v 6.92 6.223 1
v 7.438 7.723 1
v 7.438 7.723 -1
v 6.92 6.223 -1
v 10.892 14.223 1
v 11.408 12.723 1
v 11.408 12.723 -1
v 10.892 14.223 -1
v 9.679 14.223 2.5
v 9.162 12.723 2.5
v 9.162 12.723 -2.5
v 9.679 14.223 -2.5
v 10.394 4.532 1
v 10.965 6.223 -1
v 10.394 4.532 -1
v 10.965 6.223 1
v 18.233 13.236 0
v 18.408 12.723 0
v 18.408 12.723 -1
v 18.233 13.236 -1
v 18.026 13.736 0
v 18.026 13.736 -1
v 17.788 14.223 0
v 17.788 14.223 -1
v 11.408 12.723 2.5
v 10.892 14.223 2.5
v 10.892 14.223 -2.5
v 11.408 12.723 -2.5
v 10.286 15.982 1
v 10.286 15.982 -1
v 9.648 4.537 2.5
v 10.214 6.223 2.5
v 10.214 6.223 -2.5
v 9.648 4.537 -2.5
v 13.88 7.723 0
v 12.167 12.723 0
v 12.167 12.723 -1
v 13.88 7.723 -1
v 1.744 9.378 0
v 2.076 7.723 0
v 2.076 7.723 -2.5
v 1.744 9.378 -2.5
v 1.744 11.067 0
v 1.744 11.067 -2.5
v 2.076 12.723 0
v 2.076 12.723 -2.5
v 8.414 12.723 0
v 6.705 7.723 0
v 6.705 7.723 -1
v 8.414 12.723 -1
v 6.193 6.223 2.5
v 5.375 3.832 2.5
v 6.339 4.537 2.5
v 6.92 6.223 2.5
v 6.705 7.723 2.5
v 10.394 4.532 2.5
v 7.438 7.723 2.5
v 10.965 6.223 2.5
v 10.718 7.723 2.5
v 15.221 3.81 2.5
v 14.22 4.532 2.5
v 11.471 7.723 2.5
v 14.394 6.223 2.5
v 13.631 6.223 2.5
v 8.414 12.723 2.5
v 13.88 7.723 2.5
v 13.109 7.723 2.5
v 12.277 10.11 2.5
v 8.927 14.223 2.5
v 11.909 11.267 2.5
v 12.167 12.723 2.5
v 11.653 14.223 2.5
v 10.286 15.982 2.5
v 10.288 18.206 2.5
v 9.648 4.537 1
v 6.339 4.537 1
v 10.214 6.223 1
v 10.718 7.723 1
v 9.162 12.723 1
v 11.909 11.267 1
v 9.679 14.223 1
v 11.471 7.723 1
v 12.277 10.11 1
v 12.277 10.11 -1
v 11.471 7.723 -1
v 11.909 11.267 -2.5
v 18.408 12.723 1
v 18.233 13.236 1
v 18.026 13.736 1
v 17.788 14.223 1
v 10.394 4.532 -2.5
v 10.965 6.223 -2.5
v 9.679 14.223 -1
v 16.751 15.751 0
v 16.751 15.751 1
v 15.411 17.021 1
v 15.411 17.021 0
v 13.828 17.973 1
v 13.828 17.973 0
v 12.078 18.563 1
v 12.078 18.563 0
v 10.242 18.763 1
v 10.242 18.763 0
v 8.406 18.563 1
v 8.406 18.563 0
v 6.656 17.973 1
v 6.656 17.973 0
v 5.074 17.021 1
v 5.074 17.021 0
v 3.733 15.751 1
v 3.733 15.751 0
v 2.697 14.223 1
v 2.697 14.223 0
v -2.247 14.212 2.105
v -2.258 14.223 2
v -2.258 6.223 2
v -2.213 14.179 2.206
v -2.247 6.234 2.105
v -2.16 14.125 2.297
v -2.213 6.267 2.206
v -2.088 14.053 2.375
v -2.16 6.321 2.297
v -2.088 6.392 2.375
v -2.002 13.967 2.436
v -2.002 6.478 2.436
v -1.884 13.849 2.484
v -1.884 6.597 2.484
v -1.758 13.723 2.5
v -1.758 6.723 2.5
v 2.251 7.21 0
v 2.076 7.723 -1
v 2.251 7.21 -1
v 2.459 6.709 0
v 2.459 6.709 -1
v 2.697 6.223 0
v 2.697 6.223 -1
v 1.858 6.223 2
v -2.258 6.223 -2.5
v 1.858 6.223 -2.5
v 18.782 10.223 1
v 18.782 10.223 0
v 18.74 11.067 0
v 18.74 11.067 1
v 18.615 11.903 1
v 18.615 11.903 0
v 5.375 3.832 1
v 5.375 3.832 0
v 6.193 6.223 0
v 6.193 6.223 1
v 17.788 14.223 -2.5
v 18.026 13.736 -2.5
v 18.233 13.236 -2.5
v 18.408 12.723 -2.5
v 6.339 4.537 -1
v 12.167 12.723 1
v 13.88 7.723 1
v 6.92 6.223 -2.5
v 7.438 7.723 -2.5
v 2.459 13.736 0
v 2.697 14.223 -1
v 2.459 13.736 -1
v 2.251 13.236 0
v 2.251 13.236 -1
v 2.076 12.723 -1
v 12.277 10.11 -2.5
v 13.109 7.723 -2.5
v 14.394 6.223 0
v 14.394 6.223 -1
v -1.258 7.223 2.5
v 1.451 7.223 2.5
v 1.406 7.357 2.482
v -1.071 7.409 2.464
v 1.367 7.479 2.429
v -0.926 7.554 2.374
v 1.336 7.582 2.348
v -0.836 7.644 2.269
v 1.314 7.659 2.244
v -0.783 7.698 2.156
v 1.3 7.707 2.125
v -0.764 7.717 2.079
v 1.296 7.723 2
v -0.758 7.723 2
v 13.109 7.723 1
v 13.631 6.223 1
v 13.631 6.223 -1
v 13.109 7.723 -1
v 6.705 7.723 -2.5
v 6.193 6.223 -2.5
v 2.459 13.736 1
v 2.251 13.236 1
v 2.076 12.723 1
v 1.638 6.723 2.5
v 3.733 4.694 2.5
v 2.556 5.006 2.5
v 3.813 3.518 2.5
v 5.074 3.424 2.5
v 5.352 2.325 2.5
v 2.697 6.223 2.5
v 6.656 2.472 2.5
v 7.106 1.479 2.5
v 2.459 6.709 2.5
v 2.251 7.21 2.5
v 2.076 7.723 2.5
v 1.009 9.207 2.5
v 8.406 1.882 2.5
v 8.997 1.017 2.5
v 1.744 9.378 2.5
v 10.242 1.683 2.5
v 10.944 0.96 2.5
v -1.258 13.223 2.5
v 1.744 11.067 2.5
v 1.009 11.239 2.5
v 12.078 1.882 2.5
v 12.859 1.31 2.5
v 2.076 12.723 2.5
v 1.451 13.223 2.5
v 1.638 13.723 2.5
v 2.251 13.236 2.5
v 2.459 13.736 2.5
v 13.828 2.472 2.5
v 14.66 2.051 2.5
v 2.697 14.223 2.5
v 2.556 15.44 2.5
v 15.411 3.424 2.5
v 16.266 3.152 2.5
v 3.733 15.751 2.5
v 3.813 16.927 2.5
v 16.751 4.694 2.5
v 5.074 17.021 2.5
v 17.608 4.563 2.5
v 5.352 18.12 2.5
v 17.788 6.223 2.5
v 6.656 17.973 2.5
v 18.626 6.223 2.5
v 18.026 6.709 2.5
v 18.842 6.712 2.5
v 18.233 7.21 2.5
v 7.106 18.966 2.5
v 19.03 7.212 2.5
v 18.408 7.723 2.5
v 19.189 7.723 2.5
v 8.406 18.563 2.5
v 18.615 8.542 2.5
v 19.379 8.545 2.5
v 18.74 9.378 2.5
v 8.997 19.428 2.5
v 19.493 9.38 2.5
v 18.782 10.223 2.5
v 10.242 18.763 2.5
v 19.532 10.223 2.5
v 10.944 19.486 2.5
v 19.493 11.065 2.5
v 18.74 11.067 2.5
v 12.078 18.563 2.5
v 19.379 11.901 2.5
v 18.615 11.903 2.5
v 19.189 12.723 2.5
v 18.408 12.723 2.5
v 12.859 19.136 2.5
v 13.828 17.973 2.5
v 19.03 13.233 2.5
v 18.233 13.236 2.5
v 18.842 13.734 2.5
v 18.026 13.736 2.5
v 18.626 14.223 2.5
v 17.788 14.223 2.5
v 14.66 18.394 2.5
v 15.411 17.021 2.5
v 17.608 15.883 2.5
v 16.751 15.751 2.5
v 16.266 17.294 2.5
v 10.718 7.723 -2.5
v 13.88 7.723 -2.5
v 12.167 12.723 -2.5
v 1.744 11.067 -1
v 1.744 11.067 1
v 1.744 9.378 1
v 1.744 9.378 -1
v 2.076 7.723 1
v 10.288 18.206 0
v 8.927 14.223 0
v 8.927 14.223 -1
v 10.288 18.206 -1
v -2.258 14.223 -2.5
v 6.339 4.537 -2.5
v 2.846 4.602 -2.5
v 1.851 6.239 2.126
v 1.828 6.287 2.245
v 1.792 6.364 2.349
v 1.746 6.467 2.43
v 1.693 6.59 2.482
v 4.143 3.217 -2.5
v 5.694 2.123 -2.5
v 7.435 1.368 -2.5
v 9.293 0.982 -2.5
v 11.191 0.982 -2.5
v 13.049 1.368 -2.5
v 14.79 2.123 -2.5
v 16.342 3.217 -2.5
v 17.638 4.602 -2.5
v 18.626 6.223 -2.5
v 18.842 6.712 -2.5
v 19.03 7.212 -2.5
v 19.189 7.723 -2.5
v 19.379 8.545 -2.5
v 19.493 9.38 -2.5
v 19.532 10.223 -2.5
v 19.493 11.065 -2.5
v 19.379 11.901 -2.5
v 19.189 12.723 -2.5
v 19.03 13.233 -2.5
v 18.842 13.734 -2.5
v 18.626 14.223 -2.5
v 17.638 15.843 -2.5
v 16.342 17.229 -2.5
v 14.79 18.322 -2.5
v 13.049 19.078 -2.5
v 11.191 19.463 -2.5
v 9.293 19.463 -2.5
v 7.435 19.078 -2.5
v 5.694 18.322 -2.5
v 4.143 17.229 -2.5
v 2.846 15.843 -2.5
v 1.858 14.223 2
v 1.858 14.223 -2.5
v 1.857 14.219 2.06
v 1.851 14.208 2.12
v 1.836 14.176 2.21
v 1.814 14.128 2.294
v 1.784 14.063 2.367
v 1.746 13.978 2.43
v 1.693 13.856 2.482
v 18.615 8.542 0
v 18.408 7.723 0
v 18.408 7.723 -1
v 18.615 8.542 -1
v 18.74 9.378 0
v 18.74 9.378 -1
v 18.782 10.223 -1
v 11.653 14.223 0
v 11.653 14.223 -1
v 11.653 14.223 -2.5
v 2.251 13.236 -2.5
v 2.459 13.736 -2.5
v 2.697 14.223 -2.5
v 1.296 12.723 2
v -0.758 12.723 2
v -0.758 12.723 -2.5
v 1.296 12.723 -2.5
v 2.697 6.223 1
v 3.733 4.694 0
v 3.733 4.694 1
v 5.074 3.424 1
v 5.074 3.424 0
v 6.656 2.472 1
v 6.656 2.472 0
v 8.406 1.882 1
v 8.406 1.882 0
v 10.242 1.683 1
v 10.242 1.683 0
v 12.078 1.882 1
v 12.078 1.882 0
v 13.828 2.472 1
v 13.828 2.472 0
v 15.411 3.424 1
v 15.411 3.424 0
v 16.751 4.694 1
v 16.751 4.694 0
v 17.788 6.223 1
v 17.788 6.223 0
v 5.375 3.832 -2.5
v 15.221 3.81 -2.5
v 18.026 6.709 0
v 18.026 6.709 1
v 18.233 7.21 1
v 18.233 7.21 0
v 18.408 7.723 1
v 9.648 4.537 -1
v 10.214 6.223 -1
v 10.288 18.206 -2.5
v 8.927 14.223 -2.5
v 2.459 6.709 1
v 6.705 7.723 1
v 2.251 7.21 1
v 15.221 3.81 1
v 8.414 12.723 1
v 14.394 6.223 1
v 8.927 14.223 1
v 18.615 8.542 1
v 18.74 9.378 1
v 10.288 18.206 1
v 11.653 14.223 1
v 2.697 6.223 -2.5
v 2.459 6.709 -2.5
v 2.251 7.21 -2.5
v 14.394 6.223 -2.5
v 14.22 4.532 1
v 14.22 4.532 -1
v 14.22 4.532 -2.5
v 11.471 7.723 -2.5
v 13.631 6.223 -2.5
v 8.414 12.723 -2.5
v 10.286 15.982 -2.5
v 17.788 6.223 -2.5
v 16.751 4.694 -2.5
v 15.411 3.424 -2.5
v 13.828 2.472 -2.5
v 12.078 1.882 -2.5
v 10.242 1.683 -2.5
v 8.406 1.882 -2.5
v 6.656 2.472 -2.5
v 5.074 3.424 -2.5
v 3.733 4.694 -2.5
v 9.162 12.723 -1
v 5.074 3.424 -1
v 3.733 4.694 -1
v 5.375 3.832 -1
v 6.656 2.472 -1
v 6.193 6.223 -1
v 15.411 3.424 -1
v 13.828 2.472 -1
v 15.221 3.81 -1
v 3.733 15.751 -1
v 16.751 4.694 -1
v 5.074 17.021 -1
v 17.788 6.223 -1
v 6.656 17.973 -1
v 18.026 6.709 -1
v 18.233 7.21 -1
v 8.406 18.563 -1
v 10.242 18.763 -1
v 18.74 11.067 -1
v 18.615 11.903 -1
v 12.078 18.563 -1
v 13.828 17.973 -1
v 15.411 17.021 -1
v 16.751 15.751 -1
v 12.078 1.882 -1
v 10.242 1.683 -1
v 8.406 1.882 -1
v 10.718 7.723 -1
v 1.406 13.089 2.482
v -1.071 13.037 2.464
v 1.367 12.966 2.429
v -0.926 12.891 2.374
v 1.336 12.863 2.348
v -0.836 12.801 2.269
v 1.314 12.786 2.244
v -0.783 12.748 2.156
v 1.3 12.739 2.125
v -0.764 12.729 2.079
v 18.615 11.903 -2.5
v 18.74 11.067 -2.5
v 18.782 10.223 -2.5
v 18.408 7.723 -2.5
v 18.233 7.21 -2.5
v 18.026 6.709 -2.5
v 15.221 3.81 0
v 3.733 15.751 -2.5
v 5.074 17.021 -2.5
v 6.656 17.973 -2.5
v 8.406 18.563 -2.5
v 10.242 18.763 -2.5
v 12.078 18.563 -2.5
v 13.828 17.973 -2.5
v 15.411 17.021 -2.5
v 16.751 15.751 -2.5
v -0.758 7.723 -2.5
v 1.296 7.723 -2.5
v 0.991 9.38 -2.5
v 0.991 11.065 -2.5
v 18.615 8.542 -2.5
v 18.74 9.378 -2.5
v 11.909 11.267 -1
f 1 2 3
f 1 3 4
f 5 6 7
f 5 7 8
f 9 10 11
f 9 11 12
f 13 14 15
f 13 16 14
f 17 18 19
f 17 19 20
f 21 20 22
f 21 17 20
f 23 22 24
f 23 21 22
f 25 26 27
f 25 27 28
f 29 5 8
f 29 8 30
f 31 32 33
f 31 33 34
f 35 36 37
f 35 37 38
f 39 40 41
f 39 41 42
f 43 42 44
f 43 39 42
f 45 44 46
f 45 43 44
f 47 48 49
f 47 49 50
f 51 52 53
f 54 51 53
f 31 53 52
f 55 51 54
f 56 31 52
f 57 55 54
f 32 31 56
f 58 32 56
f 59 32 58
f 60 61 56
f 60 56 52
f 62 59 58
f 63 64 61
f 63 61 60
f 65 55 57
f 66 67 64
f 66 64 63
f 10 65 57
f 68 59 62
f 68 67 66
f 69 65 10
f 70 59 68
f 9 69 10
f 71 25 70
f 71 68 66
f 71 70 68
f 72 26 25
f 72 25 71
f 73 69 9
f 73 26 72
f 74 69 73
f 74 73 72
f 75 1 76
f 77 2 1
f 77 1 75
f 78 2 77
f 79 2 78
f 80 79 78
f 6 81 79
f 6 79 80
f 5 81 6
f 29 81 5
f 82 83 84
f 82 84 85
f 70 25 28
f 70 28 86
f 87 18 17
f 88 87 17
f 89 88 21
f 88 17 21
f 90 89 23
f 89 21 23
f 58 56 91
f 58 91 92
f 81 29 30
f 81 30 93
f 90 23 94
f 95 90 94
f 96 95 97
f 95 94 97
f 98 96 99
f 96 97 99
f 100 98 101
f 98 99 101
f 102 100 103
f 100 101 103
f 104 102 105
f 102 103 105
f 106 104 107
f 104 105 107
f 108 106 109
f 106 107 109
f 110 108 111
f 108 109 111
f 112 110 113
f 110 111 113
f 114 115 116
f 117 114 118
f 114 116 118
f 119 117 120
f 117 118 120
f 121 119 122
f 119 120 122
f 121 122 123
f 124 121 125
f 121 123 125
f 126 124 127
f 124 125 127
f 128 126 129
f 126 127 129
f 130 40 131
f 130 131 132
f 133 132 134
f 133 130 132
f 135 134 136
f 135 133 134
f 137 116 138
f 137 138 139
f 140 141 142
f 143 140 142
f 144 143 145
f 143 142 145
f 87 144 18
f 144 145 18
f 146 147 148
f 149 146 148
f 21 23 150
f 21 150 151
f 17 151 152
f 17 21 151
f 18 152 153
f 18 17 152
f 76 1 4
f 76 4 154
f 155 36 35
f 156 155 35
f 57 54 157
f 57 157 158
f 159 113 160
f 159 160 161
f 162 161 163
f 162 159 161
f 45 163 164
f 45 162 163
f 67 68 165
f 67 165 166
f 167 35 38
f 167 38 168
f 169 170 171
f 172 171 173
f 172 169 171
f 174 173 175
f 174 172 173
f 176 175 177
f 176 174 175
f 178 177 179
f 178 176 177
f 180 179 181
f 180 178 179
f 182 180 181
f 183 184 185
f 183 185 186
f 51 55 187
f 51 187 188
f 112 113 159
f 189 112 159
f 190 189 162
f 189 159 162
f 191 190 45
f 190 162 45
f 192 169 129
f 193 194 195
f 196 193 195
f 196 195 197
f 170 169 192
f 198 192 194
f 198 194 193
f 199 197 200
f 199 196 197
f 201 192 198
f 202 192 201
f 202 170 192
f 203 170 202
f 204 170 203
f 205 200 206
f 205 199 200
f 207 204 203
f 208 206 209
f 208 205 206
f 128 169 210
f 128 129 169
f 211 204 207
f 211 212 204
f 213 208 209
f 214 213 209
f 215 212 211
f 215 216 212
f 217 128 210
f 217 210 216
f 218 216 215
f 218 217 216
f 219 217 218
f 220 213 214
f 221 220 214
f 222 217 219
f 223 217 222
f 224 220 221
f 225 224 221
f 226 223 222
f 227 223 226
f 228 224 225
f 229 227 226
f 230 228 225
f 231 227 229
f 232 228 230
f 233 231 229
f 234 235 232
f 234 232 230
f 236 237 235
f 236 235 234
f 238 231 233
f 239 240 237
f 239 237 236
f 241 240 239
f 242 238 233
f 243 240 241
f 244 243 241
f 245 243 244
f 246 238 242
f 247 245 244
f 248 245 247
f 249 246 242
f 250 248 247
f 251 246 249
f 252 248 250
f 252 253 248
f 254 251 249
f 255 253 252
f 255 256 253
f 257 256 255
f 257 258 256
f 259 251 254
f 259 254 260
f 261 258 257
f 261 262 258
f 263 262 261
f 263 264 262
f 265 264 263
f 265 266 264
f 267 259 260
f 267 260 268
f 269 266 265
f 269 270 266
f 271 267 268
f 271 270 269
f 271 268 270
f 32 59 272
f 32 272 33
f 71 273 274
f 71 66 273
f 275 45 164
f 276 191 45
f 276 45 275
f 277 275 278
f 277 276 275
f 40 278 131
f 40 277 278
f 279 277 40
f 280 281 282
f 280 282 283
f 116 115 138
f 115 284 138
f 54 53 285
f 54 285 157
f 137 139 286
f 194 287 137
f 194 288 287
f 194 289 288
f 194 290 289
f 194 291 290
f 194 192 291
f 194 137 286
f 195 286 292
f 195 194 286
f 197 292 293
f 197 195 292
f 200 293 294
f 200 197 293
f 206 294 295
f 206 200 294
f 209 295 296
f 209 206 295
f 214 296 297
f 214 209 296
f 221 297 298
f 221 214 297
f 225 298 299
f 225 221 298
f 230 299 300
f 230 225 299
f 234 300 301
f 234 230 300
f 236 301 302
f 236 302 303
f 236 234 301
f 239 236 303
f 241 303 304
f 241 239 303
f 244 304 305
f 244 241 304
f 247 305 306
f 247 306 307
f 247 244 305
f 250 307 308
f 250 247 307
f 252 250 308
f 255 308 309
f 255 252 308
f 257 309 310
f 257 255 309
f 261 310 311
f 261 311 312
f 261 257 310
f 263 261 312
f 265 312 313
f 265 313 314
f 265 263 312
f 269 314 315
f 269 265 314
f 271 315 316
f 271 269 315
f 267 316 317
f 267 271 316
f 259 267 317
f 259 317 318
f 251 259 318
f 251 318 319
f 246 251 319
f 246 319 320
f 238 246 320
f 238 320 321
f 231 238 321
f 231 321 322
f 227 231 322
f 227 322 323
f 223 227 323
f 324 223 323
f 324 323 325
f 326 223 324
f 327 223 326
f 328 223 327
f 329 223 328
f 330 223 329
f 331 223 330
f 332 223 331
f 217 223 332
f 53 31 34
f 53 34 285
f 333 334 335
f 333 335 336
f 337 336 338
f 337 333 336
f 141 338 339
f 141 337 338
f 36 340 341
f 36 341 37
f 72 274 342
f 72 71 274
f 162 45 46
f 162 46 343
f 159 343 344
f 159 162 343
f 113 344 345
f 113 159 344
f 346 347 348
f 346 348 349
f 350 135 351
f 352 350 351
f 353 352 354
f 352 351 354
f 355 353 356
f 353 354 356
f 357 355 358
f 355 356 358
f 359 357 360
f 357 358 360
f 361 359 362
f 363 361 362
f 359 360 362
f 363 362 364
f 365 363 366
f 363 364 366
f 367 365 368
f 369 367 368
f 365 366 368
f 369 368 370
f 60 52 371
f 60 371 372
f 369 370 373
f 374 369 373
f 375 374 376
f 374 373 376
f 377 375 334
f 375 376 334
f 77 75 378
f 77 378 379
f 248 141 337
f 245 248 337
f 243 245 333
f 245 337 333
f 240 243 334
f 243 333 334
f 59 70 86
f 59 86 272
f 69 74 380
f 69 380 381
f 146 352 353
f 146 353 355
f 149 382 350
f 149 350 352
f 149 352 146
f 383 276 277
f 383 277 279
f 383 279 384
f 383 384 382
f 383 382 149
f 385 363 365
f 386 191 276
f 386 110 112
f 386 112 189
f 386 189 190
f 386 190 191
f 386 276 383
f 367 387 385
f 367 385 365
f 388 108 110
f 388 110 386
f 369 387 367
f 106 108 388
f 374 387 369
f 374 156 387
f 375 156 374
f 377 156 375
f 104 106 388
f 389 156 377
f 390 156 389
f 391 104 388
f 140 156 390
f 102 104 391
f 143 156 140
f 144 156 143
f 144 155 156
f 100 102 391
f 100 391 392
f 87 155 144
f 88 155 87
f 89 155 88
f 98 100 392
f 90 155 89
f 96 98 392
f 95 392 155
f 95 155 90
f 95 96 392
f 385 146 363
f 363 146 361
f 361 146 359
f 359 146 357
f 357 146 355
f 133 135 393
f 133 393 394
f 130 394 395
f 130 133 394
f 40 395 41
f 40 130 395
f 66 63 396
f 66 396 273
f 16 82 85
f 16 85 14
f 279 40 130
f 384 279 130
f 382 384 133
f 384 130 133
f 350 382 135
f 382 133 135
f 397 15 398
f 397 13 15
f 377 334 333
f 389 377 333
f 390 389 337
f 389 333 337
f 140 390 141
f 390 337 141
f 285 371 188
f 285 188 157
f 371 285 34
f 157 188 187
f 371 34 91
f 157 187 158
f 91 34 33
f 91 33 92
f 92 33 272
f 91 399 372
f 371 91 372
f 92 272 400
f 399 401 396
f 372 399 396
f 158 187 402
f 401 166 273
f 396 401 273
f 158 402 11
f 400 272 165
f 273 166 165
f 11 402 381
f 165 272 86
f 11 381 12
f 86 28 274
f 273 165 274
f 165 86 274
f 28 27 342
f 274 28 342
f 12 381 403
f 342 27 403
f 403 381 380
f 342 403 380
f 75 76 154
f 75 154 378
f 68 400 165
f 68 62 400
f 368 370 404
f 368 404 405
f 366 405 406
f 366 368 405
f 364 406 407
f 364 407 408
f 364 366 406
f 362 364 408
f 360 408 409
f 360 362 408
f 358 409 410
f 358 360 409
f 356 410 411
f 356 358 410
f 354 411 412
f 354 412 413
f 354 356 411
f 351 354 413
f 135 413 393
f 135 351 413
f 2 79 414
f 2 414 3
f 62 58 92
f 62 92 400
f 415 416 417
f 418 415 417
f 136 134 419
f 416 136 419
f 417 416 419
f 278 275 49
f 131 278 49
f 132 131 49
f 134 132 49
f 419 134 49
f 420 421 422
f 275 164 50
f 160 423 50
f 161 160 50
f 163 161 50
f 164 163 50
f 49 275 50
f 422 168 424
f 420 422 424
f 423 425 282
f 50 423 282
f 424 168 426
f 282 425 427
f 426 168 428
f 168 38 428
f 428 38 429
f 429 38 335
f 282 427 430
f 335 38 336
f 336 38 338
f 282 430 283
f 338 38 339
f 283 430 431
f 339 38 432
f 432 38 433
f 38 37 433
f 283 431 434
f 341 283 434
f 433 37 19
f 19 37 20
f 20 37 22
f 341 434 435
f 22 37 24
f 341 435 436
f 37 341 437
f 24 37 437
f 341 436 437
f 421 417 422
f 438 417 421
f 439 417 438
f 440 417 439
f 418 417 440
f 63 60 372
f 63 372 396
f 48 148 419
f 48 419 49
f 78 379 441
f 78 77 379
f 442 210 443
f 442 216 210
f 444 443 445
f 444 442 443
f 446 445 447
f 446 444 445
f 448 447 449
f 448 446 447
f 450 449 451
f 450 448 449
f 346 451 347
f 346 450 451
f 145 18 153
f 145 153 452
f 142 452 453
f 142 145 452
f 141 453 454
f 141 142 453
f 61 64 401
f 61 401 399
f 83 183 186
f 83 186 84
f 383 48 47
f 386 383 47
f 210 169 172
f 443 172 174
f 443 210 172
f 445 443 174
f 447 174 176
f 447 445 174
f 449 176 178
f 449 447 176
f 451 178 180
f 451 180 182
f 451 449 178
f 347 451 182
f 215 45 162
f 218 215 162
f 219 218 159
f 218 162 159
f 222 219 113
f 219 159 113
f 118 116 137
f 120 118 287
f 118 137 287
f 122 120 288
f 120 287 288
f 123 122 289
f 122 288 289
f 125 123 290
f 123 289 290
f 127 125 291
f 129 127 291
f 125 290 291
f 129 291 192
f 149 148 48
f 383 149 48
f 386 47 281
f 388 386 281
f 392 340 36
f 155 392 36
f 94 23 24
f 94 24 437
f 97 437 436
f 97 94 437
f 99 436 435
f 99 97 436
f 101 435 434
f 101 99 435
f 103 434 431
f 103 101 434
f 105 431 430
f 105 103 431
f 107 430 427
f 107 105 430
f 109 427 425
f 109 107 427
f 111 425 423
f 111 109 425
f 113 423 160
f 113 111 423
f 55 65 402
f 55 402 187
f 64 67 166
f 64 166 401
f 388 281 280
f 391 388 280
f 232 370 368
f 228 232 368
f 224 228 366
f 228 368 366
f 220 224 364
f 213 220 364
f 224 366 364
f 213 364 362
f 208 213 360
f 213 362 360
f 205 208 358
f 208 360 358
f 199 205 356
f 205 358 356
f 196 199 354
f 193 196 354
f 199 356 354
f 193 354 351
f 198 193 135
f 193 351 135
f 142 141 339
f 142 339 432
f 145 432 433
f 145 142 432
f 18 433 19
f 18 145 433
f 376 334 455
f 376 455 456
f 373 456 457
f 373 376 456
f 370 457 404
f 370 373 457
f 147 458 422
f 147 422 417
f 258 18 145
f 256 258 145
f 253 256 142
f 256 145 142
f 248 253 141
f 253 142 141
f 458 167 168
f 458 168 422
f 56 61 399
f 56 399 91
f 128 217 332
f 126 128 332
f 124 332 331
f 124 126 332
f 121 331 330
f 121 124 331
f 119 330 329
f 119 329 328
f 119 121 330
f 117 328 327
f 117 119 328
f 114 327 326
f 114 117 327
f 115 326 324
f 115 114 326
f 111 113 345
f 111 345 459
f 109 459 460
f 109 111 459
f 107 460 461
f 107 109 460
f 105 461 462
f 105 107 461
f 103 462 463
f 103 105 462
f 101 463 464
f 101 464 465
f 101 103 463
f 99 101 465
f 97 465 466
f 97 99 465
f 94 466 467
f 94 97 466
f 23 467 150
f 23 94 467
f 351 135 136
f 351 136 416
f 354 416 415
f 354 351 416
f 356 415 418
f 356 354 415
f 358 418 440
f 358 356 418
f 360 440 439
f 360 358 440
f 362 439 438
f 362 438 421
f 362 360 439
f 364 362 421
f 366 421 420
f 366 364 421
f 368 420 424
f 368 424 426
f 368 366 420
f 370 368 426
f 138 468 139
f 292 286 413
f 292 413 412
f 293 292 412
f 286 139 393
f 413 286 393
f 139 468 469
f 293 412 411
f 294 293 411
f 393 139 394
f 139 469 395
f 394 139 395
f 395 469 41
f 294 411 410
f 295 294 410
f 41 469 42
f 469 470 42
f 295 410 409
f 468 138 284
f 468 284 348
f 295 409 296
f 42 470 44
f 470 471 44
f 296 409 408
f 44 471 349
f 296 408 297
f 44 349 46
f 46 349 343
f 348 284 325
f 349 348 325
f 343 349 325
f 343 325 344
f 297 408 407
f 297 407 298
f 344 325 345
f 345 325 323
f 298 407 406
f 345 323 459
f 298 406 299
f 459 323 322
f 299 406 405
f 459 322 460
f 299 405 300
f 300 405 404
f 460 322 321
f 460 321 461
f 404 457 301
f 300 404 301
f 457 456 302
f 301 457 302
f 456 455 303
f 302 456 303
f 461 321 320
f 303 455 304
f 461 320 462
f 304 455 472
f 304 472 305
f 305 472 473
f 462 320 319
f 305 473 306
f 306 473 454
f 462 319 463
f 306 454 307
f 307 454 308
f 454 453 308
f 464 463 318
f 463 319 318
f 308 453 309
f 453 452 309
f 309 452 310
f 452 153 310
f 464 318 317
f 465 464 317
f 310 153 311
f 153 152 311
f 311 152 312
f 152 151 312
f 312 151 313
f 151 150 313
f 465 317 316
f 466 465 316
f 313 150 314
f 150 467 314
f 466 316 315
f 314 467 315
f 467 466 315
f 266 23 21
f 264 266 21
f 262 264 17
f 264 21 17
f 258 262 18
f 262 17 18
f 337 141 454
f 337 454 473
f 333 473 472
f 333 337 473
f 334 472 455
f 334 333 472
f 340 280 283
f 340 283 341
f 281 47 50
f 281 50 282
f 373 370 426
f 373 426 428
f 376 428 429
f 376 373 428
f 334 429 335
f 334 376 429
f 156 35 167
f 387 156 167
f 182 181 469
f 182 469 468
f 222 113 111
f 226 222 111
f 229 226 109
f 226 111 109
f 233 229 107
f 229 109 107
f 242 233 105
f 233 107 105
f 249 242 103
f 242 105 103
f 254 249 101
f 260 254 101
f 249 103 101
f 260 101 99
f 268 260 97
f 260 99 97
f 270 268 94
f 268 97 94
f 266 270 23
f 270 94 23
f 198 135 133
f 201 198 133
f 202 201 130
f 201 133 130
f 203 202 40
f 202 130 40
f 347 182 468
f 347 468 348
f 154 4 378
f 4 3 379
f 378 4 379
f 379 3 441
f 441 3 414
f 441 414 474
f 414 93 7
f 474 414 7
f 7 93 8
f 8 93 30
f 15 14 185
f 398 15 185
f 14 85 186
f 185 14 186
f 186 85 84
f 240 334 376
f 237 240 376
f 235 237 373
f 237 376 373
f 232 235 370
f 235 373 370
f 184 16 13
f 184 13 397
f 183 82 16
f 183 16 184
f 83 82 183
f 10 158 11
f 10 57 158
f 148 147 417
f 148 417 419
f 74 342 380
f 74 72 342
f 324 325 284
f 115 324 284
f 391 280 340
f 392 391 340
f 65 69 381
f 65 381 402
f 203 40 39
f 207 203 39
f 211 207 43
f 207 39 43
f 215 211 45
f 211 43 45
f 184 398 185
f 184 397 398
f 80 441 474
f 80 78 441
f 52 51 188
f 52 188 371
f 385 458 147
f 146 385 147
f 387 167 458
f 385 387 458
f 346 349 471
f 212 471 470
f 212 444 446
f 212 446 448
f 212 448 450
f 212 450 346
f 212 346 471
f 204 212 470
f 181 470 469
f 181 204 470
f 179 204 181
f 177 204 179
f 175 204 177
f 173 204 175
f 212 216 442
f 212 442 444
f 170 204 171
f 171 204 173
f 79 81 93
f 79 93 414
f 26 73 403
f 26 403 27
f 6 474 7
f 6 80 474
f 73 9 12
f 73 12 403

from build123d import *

# Parameters (mm, degrees)
F1_DEPTH = 1
F2_DEPTH = 2.5
F3_R     = 0.5


with BuildPart() as f1:
    # F0 (on Top) → F1 (new body, symmetric)
    with BuildSketch(Plane.XY):
        with BuildLine():
            Line((8.4141432599, 12.7228097238), (2.0764058296, 12.7228097238))
            ThreePointArc((2.0764058296, 12.7228097238), (1.7022858745, 10.2228097238), (2.0764058296, 7.7228097238))
            Line((2.0764058296, 7.7228097238), (6.7053583671, 7.7228097238))
            Line((6.7053583671, 7.7228097238), (8.4141432599, 12.7228097238))
        make_face()
        with BuildLine():
            Line((8.9267787278, 14.2228097238), (2.6969832444, 14.2228097238))
            ThreePointArc((2.6969832444, 14.2228097238), (2.3509732108, 13.4875882894), (2.0764058296, 12.7228097238))
            Line((2.0764058296, 12.7228097238), (8.4141432599, 12.7228097238))
            Line((8.4141432599, 12.7228097238), (8.9267787278, 14.2228097238))
        make_face()
        with BuildLine():
            Line((11.65297826, 14.2228097238), (17.7875802403, 14.2228097238))
            ThreePointArc((17.7875802403, 14.2228097238), (10.2422817423, 18.7628055917), (2.6969832444, 14.2228097238))
            Line((2.6969832444, 14.2228097238), (8.9267787278, 14.2228097238))
            Line((8.9267787278, 14.2228097238), (10.2881211925, 18.2061737809))
            Line((10.2881211925, 18.2061737809), (11.65297826, 14.2228097238))
        make_face()
        with BuildLine():
            Line((12.1669372083, 12.7228097238), (18.4081576551, 12.7228097238))
            ThreePointArc((18.4081576551, 12.7228097238), (18.1335902739, 13.4875882894), (17.7875802403, 14.2228097238))
            Line((17.7875802403, 14.2228097238), (11.65297826, 14.2228097238))
            Line((11.65297826, 14.2228097238), (12.1669372083, 12.7228097238))
        make_face()
        with BuildLine():
            ThreePointArc((18.7822776102, 10.2228097238), (18.6882297642, 11.4867288016), (18.4081576551, 12.7228097238))
            Line((18.4081576551, 12.7228097238), (12.1669372083, 12.7228097238))
            Line((12.1669372083, 12.7228097238), (13.8801337026, 7.7228097238))
            Line((13.8801337026, 7.7228097238), (18.4081576551, 7.7228097238))
            ThreePointArc((18.4081576551, 7.7228097238), (18.6882297642, 8.958890646), (18.7822776102, 10.2228097238))
        make_face()
        with BuildLine():
            ThreePointArc((17.7875802403, 6.2228097238), (18.1335902739, 6.9580311583), (18.4081576551, 7.7228097238))
            Line((18.4081576551, 7.7228097238), (13.8801337026, 7.7228097238))
            Line((13.8801337026, 7.7228097238), (14.3940926509, 6.2228097238))
            Line((14.3940926509, 6.2228097238), (17.7875802403, 6.2228097238))
        make_face()
        with BuildLine():
            ThreePointArc((2.6969832444, 6.2228097238), (10.2422817423, 1.682813856), (17.7875802403, 6.2228097238))
            Line((17.7875802403, 6.2228097238), (14.3940926509, 6.2228097238))
            Line((14.3940926509, 6.2228097238), (15.2206683008, 3.8104313053))
            Line((15.2206683008, 3.8104313053), (5.3754938564, 3.8315519175))
            Line((5.3754938564, 3.8315519175), (6.1927228993, 6.2228097238))
            Line((6.1927228993, 6.2228097238), (2.6969832444, 6.2228097238))
        make_face()
        with BuildLine():
            ThreePointArc((2.0764058296, 7.7228097238), (2.3509732108, 6.9580311583), (2.6969832444, 6.2228097238))
            Line((2.6969832444, 6.2228097238), (6.1927228993, 6.2228097238))
            Line((6.1927228993, 6.2228097238), (6.7053583671, 7.7228097238))
            Line((6.7053583671, 7.7228097238), (2.0764058296, 7.7228097238))
        make_face()
    extrude(amount=F1_DEPTH, both=True)


with BuildPart() as f1b:
    # F0 (on Top) → F1, piece 2 (new body, symmetric)
    with BuildSketch(Plane.XY):
        Polygon((14.2196000911, 4.5315517514), (13.6307644857, 6.2228097238), (10.9651630463, 6.2228097238), (10.3942745785, 4.5315517514), align=None)
        Polygon((13.6307644857, 6.2228097238), (13.1085180736, 7.7228097238), (11.4714918947, 7.7228097238), (10.9651630463, 6.2228097238), align=None)
        Polygon((11.4714918947, 7.7228097238), (13.1085180736, 7.7228097238), (12.2773382064, 10.1101306739), align=None)
    extrude(amount=F1_DEPTH, both=True)


with BuildPart() as f1c:
    # F0 (on Top) → F1, piece 3 (new body, symmetric)
    with BuildSketch(Plane.XY):
        Polygon((11.9088649996, 11.2668357464), (11.4078211469, 12.7228097238), (9.1620651055, 12.7228097238), (7.4375745487, 7.7228097238), (10.718074478, 7.7228097238), align=None)
        Polygon((10.2140754185, 6.2228097238), (10.718074478, 7.7228097238), (7.4375745487, 7.7228097238), (6.9202273817, 6.2228097238), align=None)
        Polygon((10.2140754185, 6.2228097238), (6.9202273817, 6.2228097238), (6.3388128989, 4.5370524997), (9.6476620481, 4.5370524997), align=None)
        Polygon((9.1620651055, 12.7228097238), (11.4078211469, 12.7228097238), (10.8916266333, 14.2228097238), (9.6794122725, 14.2228097238), align=None)
        Polygon((9.6794122725, 14.2228097238), (10.8916266333, 14.2228097238), (10.2861954117, 15.9821210079), align=None)
    extrude(amount=F1_DEPTH, both=True)


with BuildPart() as f2:
    # F0 (on Top) → F2 (new body, symmetric)
    with BuildSketch(Plane.XY):
        with BuildLine():
            Line((17.7875802403, 14.2228097238), (18.6261940454, 14.2228097238))
            ThreePointArc((18.6261940454, 14.2228097238), (10.2422817423, 19.5120500321), (1.8583694393, 14.2228097238))
            Line((1.8583694393, 14.2228097238), (2.6969832444, 14.2228097238))
            ThreePointArc((2.6969832444, 14.2228097238), (10.2422817423, 18.7628055917), (17.7875802403, 14.2228097238))
        make_face()
        with BuildLine():
            Line((2.0764058296, 12.7228097238), (1.2957748539, 12.7228097238))
            ThreePointArc((1.2957748539, 12.7228097238), (0.9530414341, 10.2228097238), (1.2957748539, 7.7228097238))
            Line((1.2957748539, 7.7228097238), (2.0764058296, 7.7228097238))
            ThreePointArc((2.0764058296, 7.7228097238), (1.7022858745, 10.2228097238), (2.0764058296, 12.7228097238))
        make_face()
        with BuildLine():
            Line((2.6969832444, 14.2228097238), (1.8583694393, 14.2228097238))
            ThreePointArc((1.8583694393, 14.2228097238), (1.5446753281, 13.4849605736), (1.2957748539, 12.7228097238))
            Line((1.2957748539, 12.7228097238), (2.0764058296, 12.7228097238))
            ThreePointArc((2.0764058296, 12.7228097238), (2.3509732108, 13.4875882894), (2.6969832444, 14.2228097238))
        make_face()
        with BuildLine():
            ThreePointArc((1.2957748539, 7.7228097238), (1.5446753281, 6.960658874), (1.8583694393, 6.2228097238))
            Line((1.8583694393, 6.2228097238), (2.6969832444, 6.2228097238))
            ThreePointArc((2.6969832444, 6.2228097238), (2.3509732108, 6.9580311583), (2.0764058296, 7.7228097238))
            Line((2.0764058296, 7.7228097238), (1.2957748539, 7.7228097238))
        make_face()
        with BuildLine():
            ThreePointArc((1.8583694393, 6.2228097238), (10.2422817423, 0.9335694156), (18.6261940454, 6.2228097238))
            Line((18.6261940454, 6.2228097238), (17.7875802403, 6.2228097238))
            ThreePointArc((17.7875802403, 6.2228097238), (10.2422817423, 1.682813856), (2.6969832444, 6.2228097238))
            Line((2.6969832444, 6.2228097238), (1.8583694393, 6.2228097238))
        make_face()
        with BuildLine():
            ThreePointArc((18.6261940454, 6.2228097238), (18.9398881566, 6.960658874), (19.1887886308, 7.7228097238))
            Line((19.1887886308, 7.7228097238), (18.4081576551, 7.7228097238))
            ThreePointArc((18.4081576551, 7.7228097238), (18.1335902739, 6.9580311583), (17.7875802403, 6.2228097238))
            Line((17.7875802403, 6.2228097238), (18.6261940454, 6.2228097238))
        make_face()
        with BuildLine():
            ThreePointArc((19.1887886308, 7.7228097238), (19.4454398392, 8.9611177847), (19.5315220506, 10.2228097238))
            ThreePointArc((19.5315220506, 10.2228097238), (19.4454398392, 11.484501663), (19.1887886308, 12.7228097238))
            Line((19.1887886308, 12.7228097238), (18.4081576551, 12.7228097238))
            ThreePointArc((18.4081576551, 12.7228097238), (18.6882297642, 11.4867288016), (18.7822776102, 10.2228097238))
            ThreePointArc((18.7822776102, 10.2228097238), (18.6882297642, 8.958890646), (18.4081576551, 7.7228097238))
            Line((18.4081576551, 7.7228097238), (19.1887886308, 7.7228097238))
        make_face()
        with BuildLine():
            Line((18.4081576551, 12.7228097238), (19.1887886308, 12.7228097238))
            ThreePointArc((19.1887886308, 12.7228097238), (18.9398881566, 13.4849605736), (18.6261940454, 14.2228097238))
            Line((18.6261940454, 14.2228097238), (17.7875802403, 14.2228097238))
            ThreePointArc((17.7875802403, 14.2228097238), (18.1335902739, 13.4875882894), (18.4081576551, 12.7228097238))
        make_face()
        with BuildLine():
            ThreePointArc((1.2957748539, 12.7228097238), (1.5446753281, 13.4849605736), (1.8583694393, 14.2228097238))
            Line((1.8583694393, 14.2228097238), (-2.2577182577, 14.2228097238))
            Line((-2.2577182577, 14.2228097238), (-2.2577182577, 6.2228097238))
            Line((-2.2577182577, 6.2228097238), (1.8583694393, 6.2228097238))
            ThreePointArc((1.8583694393, 6.2228097238), (1.5446753281, 6.960658874), (1.2957748539, 7.7228097238))
            Line((1.2957748539, 7.7228097238), (-0.7577182577, 7.7228097238))
            Line((-0.7577182577, 7.7228097238), (-0.7577182577, 12.7228097238))
            Line((-0.7577182577, 12.7228097238), (1.2957748539, 12.7228097238))
        make_face()
    extrude(amount=F2_DEPTH, both=True)

    # F3
    f3_edges = [f2.edges().sort_by_distance(p)[0] for p in [
        (0.269028, 12.72281, 2.5),
        (-0.757718, 10.22281, 2.5),
        (0.269028, 7.72281, 2.5),
        (-0.199674, 6.22281, 2.5),
        (-2.257718, 10.22281, 2.5),
        (-0.199674, 14.22281, 2.5),
    ]]
    fillet(f3_edges, radius=F3_R)


with BuildPart() as f2b:
    # F0 (on Top) → F2, piece 2 (new body, symmetric)
    with BuildSketch(Plane.XY):
        Polygon((10.8916266333, 14.2228097238), (11.65297826, 14.2228097238), (10.2881211925, 18.2061737809), (8.9267787278, 14.2228097238), (9.6794122725, 14.2228097238), (10.2861954117, 15.9821210079), align=None)
        Polygon((11.4078211469, 12.7228097238), (12.1669372083, 12.7228097238), (11.65297826, 14.2228097238), (10.8916266333, 14.2228097238), align=None)
        Polygon((9.6794122725, 14.2228097238), (8.9267787278, 14.2228097238), (8.4141432599, 12.7228097238), (9.1620651055, 12.7228097238), align=None)
        Polygon((7.4375745487, 7.7228097238), (9.1620651055, 12.7228097238), (8.4141432599, 12.7228097238), (6.7053583671, 7.7228097238), align=None)
        Polygon((13.8801337026, 7.7228097238), (12.1669372083, 12.7228097238), (11.4078211469, 12.7228097238), (11.9088649996, 11.2668357464), (10.718074478, 7.7228097238), (11.4714918947, 7.7228097238), (12.2773382064, 10.1101306739), (13.1085180736, 7.7228097238), align=None)
        Polygon((14.3940926509, 6.2228097238), (13.8801337026, 7.7228097238), (13.1085180736, 7.7228097238), (13.6307644857, 6.2228097238), align=None)
        Polygon((15.2206683008, 3.8104313053), (14.3940926509, 6.2228097238), (13.6307644857, 6.2228097238), (14.2196000911, 4.5315517514), (10.3942745785, 4.5315517514), (10.9651630463, 6.2228097238), (10.2140754185, 6.2228097238), (9.6476620481, 4.5370524997), (6.3388128989, 4.5370524997), (6.9202273817, 6.2228097238), (6.1927228993, 6.2228097238), (5.3754938564, 3.8315519175), align=None)
        Polygon((10.9651630463, 6.2228097238), (11.4714918947, 7.7228097238), (10.718074478, 7.7228097238), (10.2140754185, 6.2228097238), align=None)
        Polygon((6.7053583671, 7.7228097238), (6.1927228993, 6.2228097238), (6.9202273817, 6.2228097238), (7.4375745487, 7.7228097238), align=None)
    extrude(amount=F2_DEPTH, both=True)


solid = Compound([f1.part, f1b.part, f1c.part, f2.part, f2b.part])
